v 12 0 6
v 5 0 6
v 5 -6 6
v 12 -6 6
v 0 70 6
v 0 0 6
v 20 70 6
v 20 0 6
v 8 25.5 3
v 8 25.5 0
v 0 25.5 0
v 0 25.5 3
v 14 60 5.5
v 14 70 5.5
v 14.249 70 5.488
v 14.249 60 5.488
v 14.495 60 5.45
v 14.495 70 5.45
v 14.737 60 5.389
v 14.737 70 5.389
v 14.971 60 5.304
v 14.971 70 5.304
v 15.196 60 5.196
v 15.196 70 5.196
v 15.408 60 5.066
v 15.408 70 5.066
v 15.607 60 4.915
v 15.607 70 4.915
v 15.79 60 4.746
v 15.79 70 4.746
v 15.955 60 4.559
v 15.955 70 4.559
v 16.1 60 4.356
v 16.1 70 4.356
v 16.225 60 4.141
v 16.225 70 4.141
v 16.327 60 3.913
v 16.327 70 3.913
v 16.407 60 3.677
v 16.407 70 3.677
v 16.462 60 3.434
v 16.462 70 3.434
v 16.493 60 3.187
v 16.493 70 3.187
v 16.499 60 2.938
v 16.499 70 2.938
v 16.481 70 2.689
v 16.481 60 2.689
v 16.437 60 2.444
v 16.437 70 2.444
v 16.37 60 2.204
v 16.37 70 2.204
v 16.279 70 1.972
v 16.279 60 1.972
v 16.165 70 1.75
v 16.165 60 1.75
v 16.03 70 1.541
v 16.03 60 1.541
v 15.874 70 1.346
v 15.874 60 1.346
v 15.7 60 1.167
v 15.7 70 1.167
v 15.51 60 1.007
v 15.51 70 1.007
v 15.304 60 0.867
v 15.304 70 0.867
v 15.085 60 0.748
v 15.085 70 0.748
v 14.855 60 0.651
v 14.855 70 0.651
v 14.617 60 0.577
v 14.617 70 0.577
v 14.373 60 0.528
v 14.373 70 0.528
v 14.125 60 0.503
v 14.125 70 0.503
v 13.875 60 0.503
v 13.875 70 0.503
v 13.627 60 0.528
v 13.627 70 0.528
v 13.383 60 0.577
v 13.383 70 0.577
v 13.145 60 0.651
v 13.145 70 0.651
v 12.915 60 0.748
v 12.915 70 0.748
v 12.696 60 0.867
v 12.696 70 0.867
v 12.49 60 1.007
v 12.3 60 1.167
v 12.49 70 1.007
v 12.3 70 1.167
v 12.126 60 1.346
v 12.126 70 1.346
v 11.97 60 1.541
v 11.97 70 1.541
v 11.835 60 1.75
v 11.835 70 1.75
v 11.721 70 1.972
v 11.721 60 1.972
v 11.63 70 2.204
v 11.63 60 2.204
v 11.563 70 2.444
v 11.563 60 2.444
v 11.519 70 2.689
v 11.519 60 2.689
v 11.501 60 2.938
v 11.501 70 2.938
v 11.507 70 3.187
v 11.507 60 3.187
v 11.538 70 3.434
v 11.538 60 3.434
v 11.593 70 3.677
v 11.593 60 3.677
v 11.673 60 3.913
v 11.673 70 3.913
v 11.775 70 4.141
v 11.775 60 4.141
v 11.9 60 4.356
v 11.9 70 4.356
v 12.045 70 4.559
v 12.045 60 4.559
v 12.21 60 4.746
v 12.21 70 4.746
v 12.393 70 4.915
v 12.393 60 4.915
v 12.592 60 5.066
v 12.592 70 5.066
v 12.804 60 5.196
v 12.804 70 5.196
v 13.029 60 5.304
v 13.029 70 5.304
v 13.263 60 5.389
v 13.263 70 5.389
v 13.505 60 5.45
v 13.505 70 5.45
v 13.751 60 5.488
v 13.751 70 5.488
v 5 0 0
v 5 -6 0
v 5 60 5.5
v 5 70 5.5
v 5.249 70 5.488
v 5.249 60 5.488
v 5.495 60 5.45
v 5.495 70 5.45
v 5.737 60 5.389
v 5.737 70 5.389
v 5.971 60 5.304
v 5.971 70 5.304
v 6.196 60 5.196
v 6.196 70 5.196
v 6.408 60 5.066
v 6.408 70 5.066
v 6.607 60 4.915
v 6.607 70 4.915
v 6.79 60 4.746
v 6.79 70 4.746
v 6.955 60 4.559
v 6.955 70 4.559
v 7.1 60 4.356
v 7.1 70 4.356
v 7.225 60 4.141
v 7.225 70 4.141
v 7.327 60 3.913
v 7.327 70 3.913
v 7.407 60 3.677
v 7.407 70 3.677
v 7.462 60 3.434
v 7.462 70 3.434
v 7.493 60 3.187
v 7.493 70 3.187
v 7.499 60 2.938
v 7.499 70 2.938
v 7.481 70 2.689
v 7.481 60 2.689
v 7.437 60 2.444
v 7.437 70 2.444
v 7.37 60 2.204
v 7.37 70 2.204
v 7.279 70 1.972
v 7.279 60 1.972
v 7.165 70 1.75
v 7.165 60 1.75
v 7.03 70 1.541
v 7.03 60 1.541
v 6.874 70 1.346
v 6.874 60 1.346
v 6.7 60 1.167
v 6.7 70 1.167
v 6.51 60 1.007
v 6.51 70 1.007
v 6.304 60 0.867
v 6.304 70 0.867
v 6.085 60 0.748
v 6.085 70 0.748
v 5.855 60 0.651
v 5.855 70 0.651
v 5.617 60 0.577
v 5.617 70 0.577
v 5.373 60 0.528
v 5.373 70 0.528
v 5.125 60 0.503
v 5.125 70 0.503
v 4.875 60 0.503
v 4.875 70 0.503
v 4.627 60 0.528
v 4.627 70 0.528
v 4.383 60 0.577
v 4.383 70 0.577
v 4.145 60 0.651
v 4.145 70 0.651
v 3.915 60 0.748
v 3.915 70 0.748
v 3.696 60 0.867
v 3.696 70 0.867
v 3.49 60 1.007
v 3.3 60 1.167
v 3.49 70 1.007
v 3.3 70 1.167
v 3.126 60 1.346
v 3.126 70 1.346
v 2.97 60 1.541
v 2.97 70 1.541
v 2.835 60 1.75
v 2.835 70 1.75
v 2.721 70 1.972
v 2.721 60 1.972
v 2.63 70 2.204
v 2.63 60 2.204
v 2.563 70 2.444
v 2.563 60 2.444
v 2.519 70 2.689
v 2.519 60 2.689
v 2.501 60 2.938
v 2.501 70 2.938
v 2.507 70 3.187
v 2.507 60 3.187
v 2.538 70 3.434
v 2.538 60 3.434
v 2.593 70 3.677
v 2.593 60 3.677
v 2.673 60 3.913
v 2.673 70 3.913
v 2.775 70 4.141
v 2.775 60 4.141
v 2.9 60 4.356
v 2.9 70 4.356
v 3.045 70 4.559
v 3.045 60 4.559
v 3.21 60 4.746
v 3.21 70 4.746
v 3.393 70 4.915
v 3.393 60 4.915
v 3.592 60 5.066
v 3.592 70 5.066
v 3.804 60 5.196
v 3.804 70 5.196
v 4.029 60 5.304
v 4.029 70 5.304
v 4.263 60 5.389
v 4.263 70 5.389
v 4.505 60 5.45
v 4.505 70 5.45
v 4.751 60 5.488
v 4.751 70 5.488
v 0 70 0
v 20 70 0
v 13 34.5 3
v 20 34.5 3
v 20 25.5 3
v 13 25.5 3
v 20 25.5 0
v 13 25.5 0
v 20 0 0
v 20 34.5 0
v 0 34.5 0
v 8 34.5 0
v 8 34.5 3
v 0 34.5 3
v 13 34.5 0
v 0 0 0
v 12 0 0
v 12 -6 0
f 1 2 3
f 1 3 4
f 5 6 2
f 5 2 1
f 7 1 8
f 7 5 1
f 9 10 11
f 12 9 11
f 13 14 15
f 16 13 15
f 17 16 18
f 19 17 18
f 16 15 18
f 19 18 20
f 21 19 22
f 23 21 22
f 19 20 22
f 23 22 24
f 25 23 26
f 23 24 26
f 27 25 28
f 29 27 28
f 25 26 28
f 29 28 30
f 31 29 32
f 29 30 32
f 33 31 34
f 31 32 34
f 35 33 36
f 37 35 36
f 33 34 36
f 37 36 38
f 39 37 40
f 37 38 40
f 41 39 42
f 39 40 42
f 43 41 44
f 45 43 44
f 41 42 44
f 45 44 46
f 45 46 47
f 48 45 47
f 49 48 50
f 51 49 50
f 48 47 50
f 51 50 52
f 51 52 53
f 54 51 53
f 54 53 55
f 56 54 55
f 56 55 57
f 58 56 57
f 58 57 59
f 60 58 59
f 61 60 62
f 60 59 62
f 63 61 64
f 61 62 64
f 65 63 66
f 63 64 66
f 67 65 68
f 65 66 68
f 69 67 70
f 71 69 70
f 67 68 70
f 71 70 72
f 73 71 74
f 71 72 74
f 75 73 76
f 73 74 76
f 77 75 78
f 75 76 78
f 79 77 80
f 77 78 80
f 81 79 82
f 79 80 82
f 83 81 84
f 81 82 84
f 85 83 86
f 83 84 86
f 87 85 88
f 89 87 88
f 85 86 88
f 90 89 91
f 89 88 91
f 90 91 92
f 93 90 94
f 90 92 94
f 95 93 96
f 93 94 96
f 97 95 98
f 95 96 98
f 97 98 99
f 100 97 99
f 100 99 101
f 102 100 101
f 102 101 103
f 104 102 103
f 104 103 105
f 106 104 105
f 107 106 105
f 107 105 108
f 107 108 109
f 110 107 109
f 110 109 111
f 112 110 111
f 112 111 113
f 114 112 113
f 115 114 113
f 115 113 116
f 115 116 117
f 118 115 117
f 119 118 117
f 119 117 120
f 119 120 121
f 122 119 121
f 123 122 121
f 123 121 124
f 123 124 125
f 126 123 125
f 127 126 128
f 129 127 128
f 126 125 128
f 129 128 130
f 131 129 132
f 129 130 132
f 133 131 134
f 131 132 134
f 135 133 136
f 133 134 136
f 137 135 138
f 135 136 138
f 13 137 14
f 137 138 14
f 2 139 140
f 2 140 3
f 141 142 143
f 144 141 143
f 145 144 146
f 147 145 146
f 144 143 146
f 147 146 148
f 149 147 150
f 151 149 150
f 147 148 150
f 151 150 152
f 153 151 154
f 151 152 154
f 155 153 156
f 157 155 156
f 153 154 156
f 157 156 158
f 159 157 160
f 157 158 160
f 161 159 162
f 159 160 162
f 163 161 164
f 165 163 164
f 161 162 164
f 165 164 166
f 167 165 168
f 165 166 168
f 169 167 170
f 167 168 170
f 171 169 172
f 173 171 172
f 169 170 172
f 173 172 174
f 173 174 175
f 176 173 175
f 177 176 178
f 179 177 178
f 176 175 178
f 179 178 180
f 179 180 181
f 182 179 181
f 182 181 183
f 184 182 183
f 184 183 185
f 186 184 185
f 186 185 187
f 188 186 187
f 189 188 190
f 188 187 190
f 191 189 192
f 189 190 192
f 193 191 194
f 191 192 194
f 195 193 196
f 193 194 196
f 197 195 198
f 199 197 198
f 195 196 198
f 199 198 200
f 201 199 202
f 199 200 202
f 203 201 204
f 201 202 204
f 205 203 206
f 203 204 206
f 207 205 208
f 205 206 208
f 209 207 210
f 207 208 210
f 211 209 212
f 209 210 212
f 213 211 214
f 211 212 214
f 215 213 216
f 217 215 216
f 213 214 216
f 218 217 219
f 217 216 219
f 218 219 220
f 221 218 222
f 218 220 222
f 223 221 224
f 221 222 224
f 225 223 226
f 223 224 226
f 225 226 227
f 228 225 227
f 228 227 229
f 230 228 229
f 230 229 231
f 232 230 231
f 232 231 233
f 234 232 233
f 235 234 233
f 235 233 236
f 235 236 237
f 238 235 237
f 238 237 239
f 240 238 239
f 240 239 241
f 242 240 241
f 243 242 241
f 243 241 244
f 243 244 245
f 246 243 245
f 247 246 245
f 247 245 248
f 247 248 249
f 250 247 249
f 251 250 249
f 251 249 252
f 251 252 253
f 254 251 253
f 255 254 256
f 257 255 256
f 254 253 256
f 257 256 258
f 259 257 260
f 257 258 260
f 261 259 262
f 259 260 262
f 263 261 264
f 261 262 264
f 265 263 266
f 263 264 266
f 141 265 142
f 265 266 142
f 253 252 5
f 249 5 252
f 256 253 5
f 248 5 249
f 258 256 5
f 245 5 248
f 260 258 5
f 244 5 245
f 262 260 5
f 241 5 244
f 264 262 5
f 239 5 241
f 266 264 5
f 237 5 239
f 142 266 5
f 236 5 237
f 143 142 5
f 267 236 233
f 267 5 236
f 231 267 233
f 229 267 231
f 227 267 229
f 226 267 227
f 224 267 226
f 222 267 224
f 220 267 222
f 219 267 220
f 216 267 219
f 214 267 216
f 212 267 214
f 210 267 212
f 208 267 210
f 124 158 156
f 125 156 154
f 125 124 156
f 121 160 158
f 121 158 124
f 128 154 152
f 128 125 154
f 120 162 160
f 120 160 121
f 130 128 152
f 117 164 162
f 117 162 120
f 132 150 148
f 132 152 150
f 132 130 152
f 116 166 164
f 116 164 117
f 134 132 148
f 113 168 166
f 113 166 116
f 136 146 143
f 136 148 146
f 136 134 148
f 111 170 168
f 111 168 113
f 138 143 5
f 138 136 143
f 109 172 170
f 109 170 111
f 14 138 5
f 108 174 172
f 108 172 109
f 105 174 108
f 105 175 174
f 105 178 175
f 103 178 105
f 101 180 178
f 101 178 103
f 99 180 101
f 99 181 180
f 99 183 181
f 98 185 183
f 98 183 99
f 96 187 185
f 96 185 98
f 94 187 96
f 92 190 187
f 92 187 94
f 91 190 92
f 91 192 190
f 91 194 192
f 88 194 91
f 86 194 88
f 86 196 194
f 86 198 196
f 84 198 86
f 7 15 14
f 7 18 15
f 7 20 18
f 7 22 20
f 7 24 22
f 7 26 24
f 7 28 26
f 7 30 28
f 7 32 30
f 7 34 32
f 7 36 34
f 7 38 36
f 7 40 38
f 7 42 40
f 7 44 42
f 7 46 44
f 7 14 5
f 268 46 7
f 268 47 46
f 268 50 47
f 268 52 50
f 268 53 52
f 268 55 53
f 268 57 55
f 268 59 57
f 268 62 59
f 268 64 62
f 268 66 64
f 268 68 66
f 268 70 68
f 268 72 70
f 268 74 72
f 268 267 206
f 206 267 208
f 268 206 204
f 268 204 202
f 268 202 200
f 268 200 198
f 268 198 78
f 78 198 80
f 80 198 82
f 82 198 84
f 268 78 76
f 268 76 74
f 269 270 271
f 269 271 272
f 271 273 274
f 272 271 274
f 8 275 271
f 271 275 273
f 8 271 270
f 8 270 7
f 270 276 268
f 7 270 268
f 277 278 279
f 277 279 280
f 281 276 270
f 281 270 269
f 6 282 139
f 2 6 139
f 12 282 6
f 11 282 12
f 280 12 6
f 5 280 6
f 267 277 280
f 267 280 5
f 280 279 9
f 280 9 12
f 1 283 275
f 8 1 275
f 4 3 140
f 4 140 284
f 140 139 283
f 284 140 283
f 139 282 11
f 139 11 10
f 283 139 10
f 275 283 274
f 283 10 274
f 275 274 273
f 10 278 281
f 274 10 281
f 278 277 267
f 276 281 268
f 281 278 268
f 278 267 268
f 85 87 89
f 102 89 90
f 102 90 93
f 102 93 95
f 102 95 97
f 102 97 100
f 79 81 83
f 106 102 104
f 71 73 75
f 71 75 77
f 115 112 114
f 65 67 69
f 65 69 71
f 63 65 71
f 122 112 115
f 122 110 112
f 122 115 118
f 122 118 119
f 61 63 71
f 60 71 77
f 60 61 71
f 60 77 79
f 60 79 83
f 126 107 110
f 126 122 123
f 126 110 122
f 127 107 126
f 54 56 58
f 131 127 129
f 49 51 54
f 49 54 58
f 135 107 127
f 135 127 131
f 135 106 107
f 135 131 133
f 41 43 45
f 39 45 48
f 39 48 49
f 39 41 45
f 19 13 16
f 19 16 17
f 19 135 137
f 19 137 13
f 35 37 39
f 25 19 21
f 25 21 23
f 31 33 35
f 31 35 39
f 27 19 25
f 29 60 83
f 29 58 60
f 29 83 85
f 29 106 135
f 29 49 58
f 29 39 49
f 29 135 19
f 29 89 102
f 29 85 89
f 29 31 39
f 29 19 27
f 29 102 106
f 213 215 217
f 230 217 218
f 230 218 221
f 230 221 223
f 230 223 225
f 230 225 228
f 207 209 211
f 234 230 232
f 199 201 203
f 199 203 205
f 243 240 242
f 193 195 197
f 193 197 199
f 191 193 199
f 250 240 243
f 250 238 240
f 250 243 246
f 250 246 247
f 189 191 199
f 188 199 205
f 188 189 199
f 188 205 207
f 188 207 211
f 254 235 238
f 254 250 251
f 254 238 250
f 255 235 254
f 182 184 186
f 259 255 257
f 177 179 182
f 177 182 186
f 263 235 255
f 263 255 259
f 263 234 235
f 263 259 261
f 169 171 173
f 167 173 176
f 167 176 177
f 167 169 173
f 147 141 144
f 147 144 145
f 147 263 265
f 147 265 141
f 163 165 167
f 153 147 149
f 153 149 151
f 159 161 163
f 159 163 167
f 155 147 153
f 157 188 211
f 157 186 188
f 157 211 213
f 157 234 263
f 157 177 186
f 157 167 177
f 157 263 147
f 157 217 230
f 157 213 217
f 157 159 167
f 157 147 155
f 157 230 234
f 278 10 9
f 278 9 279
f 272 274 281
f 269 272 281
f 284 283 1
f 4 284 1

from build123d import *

# Parameters (mm, degrees)
ESQUISSE1_W                = 20
ESQUISSE1_H                = 70
BOSS_EXTRU_1_DEPTH         = 6
ESQUISSE2_W                = 8
ESQUISSE2_H                = 9
ESQUISSE2_W_2              = 7
ENL_V_MAT_EXTRU_1_DEPTH    = 3
ESQUISSE3_W                = 7
ESQUISSE3_H                = 6
BOSS_EXTRU_2_DEPTH         = 6
ESQUISSE4_R                = 2.5
ENL_V_MAT_EXTRU_2_DEPTH    = 10
R_P_TITION_LIN_AIRE1_COUNT = 2
R_P_TITION_LIN_AIRE1_PITCH = 9


with BuildPart() as part:
    # Esquisse1 → Boss.-Extru.1 (new body)
    with BuildSketch(Plane.XY):
        with Locations((10, 35)):
            Rectangle(ESQUISSE1_W, ESQUISSE1_H)
    extrude(amount=BOSS_EXTRU_1_DEPTH)

    # Esquisse2 → Enlèv. mat.-Extru.1 (cut)
    with BuildSketch(Plane(origin=(0, 0, 0), x_dir=(-1, 0, 0), z_dir=(0, 0, -1))):
        with Locations((-4, 30)):
            Rectangle(ESQUISSE2_W, ESQUISSE2_H)
        with Locations((-16.5, 30)):
            Rectangle(ESQUISSE2_W_2, ESQUISSE2_H)
    extrude(amount=-ENL_V_MAT_EXTRU_1_DEPTH, mode=Mode.SUBTRACT)

    # Esquisse3 → Boss.-Extru.2 (add)
    with BuildSketch(Plane.XZ):
        with Locations((8.5, 3)):
            Rectangle(ESQUISSE3_W, ESQUISSE3_H)
    extrude(amount=BOSS_EXTRU_2_DEPTH)

    # Esquisse4 → Enlèv. mat.-Extru.2 (cut)
    with BuildSketch(Plane(origin=(0, 70, 0), x_dir=(1, 0, 0), z_dir=(0, 1, 0))):
        with Locations(Location((5, -3, 0), (0, 0, 270))):
            Circle(ESQUISSE4_R)
    enl_v_mat_extru_2 = extrude(amount=-ENL_V_MAT_EXTRU_2_DEPTH, mode=Mode.SUBTRACT)

    # Répétition linéaire1: Enlèv. mat.-Extru.2 ×2
    with Locations(*[(i * R_P_TITION_LIN_AIRE1_PITCH, 0, 0) for i in range(1, R_P_TITION_LIN_AIRE1_COUNT)]):
        add(enl_v_mat_extru_2, mode=Mode.SUBTRACT)


solid = part.part
